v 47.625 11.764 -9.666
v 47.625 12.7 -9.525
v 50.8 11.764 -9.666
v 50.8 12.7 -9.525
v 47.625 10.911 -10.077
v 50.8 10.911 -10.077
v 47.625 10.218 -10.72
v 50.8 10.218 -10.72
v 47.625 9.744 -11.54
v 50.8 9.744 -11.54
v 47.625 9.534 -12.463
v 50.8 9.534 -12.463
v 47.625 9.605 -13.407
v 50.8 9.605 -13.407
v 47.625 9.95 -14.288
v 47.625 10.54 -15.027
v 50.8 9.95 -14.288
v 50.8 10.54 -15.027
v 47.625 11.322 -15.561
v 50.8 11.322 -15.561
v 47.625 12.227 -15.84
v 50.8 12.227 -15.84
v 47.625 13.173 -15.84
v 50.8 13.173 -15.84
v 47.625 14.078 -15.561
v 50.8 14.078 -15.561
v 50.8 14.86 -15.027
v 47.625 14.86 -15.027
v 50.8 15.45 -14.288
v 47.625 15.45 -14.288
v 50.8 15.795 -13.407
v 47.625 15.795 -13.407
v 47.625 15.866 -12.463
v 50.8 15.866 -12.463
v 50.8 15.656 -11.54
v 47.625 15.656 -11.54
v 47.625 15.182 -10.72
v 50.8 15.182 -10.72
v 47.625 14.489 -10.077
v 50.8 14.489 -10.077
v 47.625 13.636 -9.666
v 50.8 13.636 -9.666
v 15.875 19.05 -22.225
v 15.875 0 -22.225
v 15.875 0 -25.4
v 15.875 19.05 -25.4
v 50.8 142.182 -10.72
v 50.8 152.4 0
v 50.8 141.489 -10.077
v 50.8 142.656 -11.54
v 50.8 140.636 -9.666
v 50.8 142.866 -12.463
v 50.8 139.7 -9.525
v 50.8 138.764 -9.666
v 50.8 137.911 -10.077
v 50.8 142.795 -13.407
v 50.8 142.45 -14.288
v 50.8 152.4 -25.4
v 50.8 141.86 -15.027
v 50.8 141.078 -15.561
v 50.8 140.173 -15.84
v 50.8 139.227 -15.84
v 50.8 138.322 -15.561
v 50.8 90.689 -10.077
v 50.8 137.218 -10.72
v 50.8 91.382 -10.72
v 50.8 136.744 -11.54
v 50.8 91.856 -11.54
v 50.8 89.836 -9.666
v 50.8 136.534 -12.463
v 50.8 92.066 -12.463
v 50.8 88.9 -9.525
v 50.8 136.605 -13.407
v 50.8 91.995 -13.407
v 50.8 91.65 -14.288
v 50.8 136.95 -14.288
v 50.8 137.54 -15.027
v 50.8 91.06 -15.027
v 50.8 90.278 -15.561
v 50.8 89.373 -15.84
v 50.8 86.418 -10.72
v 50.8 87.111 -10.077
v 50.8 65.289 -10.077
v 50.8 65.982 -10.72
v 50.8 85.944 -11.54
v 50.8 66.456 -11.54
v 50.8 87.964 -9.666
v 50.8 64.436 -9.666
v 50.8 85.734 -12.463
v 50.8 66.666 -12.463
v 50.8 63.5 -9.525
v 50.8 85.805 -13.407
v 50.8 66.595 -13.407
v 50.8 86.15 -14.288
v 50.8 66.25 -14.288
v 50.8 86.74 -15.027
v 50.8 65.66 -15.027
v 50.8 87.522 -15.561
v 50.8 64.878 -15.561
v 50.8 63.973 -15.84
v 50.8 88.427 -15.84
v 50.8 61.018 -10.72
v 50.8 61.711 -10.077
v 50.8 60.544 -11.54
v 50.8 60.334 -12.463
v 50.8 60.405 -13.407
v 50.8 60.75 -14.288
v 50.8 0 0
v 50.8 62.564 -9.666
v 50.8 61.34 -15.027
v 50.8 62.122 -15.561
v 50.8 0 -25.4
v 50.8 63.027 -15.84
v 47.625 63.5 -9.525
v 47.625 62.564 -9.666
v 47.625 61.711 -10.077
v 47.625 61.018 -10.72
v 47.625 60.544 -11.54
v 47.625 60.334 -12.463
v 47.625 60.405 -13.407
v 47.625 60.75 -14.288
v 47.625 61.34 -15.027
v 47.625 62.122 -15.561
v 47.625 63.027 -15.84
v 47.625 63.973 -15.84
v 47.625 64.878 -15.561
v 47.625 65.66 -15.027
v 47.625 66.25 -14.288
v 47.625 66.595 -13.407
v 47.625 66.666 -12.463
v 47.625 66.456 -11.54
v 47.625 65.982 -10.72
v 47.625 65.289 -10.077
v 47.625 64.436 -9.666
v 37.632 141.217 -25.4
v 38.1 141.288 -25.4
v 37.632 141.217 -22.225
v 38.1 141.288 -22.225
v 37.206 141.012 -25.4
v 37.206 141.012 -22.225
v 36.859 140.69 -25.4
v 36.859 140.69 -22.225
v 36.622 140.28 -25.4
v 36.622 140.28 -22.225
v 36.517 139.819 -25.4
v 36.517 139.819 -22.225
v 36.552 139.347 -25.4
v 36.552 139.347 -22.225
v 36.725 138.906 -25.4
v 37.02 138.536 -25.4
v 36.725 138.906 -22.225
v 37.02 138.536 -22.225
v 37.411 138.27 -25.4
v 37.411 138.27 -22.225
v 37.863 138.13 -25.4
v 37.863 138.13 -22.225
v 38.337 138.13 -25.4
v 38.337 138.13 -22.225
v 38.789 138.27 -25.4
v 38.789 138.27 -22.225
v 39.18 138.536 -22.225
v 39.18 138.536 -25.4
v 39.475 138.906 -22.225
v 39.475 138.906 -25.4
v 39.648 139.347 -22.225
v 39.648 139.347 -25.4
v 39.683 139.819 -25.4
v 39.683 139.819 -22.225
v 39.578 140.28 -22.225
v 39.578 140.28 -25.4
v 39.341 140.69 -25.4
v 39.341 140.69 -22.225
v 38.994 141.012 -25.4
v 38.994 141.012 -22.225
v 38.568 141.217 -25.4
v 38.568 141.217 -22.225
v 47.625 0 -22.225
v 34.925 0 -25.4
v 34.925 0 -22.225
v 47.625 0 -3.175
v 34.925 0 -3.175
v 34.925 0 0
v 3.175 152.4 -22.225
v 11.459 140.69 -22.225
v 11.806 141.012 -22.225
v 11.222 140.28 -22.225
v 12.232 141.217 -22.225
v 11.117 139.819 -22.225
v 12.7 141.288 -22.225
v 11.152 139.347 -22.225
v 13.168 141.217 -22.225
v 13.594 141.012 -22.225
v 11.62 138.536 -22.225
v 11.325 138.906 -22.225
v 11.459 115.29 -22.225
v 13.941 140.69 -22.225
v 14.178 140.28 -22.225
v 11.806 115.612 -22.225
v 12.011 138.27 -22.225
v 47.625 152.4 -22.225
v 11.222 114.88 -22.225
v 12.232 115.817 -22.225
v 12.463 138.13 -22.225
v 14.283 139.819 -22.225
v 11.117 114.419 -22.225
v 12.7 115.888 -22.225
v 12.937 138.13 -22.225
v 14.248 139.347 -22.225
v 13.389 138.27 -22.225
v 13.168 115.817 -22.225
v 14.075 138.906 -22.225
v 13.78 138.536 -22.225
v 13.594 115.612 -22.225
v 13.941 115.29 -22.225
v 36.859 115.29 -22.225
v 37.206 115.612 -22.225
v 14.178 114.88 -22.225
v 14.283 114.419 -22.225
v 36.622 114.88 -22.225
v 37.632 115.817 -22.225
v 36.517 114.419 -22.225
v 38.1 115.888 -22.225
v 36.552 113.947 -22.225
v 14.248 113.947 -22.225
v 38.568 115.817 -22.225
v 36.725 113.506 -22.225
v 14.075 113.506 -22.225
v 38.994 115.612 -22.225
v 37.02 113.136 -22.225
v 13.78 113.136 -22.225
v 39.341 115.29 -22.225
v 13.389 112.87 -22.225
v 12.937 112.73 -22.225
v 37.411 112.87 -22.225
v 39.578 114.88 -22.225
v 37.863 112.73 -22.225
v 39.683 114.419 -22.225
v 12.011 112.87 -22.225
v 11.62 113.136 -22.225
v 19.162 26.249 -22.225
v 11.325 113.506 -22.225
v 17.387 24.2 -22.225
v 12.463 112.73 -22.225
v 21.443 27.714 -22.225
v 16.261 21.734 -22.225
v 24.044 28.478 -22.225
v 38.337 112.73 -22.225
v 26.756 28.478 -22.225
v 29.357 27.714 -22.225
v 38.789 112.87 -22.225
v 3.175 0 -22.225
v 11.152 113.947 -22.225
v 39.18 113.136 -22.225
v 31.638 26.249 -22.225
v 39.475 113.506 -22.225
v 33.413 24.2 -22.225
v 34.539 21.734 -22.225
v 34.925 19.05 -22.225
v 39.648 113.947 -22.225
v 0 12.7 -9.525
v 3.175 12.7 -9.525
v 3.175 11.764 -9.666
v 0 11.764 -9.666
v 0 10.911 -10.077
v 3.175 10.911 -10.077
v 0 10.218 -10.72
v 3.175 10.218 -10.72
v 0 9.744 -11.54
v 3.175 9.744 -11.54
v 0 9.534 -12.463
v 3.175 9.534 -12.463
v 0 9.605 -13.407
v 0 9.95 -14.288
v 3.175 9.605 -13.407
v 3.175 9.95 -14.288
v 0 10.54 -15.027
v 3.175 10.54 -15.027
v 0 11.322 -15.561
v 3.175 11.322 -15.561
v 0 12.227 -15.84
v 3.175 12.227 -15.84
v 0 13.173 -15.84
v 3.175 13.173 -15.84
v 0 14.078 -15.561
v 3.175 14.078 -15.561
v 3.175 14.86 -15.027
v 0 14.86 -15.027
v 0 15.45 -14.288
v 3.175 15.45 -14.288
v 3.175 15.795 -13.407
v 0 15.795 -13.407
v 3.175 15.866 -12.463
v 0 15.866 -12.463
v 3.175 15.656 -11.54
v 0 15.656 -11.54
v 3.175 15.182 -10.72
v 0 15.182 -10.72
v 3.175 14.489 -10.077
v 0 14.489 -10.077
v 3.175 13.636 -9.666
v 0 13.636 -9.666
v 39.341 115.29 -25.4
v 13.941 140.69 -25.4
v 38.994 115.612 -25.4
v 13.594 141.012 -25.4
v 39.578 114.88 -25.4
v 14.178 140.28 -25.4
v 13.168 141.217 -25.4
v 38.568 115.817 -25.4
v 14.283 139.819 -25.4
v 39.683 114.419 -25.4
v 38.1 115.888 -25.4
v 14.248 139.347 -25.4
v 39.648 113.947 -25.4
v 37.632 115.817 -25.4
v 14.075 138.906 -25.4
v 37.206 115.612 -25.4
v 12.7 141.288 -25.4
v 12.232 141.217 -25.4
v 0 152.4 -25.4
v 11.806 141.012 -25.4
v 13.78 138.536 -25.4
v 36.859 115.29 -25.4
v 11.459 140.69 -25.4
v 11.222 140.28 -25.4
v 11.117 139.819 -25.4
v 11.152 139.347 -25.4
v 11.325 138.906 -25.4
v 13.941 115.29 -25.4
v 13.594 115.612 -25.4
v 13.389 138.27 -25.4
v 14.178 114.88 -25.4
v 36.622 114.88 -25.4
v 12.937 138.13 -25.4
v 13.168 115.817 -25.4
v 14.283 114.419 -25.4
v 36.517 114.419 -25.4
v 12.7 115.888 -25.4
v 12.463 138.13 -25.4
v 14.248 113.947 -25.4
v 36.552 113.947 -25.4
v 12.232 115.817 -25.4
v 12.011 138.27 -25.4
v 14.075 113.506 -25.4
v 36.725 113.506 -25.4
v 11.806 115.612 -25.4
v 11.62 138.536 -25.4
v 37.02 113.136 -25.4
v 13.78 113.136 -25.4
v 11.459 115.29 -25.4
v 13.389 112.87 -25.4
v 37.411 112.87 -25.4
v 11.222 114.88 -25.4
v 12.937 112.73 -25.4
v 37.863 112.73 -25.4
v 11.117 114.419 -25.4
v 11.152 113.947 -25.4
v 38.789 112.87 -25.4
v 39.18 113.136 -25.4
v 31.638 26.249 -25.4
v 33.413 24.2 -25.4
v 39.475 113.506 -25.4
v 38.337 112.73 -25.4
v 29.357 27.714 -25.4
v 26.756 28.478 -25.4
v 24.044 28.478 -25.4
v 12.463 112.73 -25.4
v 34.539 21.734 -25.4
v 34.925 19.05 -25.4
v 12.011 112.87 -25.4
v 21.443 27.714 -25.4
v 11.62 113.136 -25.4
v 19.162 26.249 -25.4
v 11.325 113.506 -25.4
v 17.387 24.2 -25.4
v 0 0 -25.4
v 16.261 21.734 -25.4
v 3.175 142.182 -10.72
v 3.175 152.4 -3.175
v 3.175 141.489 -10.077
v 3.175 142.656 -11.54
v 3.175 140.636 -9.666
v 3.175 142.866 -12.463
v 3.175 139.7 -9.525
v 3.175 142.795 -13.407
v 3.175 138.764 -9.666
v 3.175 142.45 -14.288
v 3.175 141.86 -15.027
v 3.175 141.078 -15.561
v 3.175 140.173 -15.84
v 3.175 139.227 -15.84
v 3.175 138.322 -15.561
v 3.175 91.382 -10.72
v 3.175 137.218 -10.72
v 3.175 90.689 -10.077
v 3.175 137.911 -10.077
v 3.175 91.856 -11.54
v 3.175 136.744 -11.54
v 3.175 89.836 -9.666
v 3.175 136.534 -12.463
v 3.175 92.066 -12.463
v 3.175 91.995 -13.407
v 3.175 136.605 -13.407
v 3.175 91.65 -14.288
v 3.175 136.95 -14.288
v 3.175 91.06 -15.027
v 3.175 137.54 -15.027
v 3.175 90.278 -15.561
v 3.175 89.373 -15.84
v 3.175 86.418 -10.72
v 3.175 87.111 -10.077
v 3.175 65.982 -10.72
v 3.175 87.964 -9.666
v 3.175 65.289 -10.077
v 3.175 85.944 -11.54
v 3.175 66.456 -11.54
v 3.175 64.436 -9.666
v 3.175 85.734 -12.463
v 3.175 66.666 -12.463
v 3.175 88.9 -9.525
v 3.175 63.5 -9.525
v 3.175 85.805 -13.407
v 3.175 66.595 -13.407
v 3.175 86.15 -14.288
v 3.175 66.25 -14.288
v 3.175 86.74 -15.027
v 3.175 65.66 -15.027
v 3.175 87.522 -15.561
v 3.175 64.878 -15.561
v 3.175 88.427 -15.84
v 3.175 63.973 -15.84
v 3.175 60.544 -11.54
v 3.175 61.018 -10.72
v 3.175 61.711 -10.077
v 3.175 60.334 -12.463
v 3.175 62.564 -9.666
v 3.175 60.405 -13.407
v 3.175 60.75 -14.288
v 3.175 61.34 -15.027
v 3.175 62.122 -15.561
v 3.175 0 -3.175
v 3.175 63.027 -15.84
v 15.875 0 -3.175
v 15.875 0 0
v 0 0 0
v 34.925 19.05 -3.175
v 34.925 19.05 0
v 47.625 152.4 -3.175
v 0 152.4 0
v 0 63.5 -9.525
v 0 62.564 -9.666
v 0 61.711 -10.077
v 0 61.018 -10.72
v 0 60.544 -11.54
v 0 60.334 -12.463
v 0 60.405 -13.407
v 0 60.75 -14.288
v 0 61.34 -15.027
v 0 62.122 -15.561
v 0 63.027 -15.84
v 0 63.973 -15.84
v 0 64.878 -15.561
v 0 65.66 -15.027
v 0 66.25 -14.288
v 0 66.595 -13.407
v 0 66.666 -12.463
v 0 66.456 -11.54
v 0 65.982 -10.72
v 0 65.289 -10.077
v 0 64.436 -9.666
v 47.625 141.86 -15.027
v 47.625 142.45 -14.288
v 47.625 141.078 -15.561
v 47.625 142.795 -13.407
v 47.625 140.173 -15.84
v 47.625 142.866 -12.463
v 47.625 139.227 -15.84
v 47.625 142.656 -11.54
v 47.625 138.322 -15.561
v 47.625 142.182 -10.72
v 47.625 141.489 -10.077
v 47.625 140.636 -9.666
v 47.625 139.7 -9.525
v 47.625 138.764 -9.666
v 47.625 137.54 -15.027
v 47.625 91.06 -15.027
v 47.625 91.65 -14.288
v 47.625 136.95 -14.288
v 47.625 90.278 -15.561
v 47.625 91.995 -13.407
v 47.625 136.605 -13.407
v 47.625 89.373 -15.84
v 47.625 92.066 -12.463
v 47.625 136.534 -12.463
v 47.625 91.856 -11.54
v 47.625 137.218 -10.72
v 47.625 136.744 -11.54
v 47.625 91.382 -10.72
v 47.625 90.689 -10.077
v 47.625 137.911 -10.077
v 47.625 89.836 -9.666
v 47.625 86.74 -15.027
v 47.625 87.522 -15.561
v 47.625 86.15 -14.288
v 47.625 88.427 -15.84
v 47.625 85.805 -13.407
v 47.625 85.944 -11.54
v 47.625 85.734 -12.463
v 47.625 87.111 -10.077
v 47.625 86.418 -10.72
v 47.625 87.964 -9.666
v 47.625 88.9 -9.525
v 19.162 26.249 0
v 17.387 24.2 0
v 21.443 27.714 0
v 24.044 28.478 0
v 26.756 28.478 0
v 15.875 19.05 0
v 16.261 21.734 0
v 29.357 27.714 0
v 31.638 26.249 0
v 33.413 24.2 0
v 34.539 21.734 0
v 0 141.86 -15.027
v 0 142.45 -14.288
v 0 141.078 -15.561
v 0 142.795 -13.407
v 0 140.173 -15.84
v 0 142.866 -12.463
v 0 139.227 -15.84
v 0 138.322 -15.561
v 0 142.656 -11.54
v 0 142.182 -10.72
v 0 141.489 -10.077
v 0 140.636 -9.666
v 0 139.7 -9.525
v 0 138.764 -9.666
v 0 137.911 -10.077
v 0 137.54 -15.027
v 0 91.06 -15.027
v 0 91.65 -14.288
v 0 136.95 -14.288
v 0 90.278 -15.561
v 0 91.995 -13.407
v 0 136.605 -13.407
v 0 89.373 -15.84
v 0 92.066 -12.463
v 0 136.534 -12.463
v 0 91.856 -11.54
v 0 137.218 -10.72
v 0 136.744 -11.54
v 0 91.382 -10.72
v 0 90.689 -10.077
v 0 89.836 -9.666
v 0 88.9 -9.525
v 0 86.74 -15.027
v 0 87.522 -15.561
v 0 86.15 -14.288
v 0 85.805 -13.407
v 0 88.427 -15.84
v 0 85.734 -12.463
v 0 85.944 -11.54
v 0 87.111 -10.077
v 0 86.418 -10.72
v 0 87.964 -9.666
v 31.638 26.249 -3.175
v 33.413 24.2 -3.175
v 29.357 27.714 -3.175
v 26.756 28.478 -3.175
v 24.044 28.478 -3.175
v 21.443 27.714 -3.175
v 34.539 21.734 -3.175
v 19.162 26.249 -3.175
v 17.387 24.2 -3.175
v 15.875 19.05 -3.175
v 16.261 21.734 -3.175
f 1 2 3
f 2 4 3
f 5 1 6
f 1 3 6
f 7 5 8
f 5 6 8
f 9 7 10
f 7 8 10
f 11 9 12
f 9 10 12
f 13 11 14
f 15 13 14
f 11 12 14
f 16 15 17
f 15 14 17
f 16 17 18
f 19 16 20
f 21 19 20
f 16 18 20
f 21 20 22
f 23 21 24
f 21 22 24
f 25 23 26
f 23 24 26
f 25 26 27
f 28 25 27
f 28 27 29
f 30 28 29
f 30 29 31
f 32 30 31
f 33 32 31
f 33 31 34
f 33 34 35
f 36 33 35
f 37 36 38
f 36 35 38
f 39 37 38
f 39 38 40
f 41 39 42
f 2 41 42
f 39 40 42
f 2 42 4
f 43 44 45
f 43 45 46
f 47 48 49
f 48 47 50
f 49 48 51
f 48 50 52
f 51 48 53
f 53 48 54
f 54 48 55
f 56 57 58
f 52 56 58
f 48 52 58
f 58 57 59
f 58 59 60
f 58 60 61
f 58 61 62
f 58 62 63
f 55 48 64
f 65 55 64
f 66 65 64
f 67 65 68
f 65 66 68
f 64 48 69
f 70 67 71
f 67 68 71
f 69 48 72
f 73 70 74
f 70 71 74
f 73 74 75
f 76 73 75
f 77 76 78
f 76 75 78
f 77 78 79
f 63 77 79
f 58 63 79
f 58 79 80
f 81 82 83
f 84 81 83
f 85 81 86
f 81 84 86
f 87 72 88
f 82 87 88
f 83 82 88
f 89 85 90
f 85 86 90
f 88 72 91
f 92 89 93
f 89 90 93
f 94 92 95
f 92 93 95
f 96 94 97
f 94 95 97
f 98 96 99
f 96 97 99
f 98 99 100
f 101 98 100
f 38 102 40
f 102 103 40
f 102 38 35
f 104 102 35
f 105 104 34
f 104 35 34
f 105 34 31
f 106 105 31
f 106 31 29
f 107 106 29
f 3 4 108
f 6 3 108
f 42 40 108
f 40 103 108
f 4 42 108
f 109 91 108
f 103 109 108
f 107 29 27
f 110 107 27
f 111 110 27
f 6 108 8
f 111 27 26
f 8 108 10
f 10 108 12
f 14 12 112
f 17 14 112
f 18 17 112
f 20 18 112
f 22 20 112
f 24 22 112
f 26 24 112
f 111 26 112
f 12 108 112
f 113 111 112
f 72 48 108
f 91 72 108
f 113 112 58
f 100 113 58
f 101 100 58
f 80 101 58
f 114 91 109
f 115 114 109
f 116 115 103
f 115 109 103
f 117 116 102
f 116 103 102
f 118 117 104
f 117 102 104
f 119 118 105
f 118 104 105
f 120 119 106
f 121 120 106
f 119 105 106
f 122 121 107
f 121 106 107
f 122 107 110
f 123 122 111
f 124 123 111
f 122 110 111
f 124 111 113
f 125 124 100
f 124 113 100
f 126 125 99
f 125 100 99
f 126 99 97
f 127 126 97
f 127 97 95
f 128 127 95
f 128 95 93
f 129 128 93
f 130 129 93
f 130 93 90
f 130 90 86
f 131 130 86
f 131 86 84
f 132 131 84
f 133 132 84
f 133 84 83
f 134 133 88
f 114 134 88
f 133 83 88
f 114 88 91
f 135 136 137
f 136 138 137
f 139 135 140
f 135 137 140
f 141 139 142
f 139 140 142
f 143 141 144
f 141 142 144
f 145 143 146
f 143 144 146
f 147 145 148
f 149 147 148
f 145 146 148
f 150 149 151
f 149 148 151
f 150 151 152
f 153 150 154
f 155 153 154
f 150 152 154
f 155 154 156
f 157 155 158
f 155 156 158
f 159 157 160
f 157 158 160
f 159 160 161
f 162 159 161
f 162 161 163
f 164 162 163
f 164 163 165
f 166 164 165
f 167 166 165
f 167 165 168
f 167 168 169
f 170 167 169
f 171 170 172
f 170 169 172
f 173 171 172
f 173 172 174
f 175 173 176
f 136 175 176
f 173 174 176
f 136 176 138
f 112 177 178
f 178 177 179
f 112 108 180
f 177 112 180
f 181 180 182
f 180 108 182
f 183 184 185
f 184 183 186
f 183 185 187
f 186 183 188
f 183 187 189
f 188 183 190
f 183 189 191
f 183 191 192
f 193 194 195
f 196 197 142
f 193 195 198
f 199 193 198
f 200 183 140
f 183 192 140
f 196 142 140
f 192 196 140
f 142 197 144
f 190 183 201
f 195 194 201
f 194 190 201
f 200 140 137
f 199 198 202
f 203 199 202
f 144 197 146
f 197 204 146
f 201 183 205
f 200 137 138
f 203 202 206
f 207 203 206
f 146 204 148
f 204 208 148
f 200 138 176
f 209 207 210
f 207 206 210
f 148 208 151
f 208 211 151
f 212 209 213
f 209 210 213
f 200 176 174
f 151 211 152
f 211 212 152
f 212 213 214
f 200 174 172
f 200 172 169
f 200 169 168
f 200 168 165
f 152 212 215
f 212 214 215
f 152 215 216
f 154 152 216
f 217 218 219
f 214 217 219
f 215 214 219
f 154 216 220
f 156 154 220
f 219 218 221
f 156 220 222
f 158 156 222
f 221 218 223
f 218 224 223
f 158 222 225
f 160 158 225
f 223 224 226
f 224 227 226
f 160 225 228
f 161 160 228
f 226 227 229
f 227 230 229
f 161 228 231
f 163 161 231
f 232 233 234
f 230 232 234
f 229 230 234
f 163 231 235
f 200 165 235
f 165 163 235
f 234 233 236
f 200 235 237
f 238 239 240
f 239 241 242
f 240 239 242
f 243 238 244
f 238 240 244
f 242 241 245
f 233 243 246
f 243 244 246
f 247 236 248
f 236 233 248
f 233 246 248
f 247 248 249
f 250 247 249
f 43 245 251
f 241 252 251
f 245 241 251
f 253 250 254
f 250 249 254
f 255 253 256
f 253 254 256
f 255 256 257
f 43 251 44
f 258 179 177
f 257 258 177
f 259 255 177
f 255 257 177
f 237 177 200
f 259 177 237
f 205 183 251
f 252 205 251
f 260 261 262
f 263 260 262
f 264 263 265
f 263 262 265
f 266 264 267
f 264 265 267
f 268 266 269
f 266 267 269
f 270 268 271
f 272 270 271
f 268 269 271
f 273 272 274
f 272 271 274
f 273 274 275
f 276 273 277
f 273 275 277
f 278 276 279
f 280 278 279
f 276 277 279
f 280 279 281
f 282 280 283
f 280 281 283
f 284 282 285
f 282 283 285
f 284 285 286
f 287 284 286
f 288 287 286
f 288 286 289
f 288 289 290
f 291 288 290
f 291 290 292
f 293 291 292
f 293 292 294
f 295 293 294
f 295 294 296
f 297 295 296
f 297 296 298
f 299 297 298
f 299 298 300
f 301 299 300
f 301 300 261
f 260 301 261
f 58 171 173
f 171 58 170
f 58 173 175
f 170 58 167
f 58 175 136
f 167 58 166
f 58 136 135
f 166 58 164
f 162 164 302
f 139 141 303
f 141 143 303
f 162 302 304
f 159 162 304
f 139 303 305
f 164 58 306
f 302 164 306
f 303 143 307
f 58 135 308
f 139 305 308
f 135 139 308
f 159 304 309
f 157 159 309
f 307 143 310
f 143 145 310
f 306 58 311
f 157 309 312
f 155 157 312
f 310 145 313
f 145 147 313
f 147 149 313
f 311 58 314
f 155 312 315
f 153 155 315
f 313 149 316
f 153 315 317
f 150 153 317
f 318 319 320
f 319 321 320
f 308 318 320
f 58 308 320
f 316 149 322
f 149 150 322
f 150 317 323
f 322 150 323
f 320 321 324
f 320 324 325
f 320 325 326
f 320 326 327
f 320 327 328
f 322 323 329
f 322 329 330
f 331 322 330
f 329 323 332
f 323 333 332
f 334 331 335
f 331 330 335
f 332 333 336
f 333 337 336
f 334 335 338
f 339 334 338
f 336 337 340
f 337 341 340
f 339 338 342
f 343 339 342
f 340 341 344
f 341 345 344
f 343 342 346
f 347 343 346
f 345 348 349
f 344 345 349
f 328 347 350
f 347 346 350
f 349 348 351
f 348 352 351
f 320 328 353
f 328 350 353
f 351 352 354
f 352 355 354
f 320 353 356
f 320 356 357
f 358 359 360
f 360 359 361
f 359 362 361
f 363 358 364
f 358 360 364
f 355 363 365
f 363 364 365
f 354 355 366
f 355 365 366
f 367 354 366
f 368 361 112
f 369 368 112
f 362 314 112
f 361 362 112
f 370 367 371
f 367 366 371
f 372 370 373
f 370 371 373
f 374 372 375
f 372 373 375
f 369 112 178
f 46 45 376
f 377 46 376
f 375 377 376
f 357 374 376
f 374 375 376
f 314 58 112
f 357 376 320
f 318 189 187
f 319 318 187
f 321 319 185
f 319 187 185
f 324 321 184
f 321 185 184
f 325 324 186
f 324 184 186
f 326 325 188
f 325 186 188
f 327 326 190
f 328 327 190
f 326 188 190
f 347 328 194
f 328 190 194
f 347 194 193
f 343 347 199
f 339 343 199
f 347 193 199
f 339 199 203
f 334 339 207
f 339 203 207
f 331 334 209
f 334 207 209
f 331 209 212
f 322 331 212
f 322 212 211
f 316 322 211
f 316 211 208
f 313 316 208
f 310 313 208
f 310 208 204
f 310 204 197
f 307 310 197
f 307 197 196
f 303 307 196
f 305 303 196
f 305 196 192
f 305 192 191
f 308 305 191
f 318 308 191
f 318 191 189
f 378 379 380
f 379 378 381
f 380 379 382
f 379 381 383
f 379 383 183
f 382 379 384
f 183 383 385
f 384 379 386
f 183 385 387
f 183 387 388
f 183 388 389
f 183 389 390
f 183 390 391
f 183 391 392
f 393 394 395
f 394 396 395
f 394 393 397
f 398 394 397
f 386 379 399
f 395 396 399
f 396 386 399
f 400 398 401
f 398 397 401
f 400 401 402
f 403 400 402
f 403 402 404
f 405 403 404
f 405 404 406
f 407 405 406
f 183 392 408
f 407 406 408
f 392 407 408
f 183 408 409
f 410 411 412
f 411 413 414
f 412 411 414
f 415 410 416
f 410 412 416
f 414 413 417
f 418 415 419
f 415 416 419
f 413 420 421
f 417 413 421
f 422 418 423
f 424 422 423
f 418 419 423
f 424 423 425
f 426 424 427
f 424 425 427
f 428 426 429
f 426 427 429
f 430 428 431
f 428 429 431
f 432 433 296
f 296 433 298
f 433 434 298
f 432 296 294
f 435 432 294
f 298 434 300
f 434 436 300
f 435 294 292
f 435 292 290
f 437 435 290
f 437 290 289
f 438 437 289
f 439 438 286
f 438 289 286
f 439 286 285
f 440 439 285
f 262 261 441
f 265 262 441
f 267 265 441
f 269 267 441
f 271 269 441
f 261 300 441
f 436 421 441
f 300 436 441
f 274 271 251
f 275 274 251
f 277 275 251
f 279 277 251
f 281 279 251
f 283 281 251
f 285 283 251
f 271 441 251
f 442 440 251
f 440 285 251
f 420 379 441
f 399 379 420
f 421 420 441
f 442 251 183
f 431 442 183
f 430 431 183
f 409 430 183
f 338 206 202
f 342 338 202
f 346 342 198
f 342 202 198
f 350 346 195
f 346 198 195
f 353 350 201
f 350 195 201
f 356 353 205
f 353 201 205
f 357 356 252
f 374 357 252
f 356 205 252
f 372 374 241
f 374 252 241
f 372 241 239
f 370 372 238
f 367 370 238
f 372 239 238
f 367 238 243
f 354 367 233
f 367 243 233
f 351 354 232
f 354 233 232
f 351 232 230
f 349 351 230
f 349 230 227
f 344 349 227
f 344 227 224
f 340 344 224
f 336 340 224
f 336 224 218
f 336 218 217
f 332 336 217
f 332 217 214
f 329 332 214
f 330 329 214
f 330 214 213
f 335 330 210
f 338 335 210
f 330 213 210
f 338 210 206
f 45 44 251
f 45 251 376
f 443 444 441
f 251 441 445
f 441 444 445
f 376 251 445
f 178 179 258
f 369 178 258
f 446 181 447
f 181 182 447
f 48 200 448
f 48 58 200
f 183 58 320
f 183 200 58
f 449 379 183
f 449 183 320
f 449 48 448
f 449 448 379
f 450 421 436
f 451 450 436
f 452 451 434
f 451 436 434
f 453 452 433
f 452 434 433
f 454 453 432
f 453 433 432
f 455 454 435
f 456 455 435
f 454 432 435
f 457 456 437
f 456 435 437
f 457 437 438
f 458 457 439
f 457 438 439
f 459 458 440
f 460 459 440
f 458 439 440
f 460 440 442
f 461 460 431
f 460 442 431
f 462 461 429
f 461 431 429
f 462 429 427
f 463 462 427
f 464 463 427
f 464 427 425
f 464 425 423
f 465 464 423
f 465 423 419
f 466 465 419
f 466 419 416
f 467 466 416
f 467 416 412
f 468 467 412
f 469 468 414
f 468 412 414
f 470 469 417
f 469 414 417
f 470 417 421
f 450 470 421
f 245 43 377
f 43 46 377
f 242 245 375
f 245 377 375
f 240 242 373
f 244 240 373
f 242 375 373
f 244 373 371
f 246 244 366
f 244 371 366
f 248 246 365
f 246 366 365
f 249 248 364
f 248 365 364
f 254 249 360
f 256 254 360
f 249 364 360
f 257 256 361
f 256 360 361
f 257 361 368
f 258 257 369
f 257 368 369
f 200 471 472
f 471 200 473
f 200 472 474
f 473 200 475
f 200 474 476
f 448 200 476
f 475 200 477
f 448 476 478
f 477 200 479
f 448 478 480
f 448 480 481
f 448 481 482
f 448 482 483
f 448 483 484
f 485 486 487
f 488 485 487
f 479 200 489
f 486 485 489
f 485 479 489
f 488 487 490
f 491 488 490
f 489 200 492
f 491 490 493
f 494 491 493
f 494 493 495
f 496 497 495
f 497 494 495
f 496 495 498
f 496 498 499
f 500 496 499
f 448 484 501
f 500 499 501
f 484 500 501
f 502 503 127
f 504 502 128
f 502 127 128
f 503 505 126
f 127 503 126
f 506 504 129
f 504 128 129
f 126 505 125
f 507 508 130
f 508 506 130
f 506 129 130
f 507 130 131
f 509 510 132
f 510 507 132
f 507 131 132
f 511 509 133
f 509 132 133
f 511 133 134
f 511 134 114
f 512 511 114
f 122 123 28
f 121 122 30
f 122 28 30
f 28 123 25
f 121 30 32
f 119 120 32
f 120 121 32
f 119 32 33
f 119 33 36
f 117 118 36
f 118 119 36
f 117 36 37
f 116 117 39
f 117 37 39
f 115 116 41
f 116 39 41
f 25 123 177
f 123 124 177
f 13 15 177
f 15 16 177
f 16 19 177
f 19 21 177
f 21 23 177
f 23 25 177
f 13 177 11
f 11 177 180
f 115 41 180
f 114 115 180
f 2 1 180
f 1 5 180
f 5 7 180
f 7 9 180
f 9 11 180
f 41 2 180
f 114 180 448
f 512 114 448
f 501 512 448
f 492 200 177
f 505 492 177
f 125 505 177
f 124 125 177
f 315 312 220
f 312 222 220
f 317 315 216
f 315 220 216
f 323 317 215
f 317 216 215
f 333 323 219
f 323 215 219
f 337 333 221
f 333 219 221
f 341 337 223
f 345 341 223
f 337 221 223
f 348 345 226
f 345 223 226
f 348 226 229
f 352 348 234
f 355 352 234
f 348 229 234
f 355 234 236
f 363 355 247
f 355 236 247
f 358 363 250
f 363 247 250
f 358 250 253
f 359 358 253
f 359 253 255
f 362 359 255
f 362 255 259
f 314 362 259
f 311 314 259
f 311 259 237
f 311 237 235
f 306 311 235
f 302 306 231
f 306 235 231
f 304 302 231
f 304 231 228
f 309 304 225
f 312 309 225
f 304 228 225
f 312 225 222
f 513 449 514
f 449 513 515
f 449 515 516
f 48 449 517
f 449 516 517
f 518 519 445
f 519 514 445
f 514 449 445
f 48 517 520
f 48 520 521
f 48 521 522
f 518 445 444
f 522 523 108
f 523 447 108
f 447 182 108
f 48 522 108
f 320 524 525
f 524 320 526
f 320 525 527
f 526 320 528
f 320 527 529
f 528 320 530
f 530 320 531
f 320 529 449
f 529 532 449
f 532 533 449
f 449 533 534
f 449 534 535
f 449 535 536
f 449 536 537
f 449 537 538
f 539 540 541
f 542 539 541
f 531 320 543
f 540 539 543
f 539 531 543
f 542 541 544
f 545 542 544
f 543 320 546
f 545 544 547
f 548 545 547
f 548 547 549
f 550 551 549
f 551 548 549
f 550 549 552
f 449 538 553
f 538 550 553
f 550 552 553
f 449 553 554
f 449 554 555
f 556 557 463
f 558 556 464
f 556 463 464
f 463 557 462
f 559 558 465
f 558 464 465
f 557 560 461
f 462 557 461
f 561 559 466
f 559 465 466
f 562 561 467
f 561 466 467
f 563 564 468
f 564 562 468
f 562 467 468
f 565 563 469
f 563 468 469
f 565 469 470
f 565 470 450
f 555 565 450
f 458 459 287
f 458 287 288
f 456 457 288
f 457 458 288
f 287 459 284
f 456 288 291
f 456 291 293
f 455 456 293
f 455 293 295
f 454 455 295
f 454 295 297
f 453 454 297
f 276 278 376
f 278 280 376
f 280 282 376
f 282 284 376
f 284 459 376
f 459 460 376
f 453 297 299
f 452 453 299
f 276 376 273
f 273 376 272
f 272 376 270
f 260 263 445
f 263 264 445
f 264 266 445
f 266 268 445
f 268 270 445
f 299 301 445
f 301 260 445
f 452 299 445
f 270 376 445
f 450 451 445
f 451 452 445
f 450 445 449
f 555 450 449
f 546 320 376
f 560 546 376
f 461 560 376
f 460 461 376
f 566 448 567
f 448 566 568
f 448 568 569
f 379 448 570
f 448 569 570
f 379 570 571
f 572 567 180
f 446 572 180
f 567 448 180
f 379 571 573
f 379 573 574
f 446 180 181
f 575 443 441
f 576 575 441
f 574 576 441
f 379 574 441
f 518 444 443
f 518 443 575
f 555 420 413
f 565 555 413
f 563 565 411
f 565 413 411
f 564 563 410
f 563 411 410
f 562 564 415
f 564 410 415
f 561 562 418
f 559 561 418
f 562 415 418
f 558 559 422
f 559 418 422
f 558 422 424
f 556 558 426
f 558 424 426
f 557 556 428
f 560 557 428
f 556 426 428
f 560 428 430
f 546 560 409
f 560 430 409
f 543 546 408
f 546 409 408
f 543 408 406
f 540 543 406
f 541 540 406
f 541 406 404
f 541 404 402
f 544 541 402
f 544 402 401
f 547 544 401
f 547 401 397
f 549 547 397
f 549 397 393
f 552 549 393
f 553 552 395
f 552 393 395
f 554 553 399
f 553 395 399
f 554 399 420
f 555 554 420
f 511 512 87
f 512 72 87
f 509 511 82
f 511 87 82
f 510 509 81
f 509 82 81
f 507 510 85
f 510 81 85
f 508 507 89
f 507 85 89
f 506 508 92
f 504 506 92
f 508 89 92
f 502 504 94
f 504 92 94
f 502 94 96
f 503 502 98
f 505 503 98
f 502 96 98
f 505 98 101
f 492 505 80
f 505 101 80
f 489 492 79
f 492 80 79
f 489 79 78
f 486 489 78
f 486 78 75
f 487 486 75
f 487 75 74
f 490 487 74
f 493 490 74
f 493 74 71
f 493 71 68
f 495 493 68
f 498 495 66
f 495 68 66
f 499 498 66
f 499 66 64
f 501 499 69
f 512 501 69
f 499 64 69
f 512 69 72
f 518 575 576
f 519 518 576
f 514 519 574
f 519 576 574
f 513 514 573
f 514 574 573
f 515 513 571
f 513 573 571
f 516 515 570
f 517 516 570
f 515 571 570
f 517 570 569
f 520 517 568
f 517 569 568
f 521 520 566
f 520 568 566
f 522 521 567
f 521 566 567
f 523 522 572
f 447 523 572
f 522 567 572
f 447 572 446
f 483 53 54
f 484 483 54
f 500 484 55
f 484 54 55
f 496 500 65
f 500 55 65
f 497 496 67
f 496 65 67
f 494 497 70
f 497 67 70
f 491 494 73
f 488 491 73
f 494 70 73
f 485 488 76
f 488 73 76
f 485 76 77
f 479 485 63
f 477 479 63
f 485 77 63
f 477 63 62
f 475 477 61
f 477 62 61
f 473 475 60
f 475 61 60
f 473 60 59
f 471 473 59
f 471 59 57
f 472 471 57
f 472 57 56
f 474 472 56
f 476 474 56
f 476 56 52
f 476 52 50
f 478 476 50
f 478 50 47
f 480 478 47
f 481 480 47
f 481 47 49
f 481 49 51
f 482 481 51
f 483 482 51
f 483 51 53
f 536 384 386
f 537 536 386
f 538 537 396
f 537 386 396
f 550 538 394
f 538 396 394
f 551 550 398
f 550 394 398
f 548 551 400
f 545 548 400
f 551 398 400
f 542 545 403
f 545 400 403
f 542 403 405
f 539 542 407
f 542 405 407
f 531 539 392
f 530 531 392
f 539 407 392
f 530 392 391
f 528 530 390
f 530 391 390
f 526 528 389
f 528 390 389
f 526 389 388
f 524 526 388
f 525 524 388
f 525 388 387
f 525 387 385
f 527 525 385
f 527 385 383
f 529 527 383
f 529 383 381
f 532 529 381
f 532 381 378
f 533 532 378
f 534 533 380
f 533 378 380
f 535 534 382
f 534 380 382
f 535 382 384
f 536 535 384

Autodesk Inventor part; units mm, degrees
ref_plane "YZ Plane" through (0, 0, 0) normal (1, 0, 0) x (0, 1, 0)
ref_plane "XZ Plane" through (0, 0, 0) normal (0, 1, 0) x (-1, 0, 0)
ref_plane "XY Plane" through (0, 0, 0) normal (0, 0, 1) x (1, 0, 0)
sketch "Sketch1" plane through (0, 0, 0) normal (0, 1, 0) x (-1, 0, 0)
  line L0 (0, 0) -> (-50.8, 0)
  line L1 (-50.8, 0) -> (-50.8, -25.4)
  line L2 (-50.8, -25.4) -> (0, -25.4)
  line L3 (0, -25.4) -> (0, 0)
  line L4 (-3.175, -22.225) -> (-47.625, -22.225)
  line L5 (-47.625, -22.225) -> (-47.625, -3.175)
  line L6 (-47.625, -3.175) -> (-3.175, -3.175)
  line L7 (-3.175, -3.175) -> (-3.175, -22.225)
  dimension "d0" = 50.8
  dimension "d1" = 25.4
  dimension "d2" = 44.45
  dimension "d3" = 19.05
  dimension "d4" = 3.175
  dimension "d5" = 3.175
extrude "Extrusion1" add sketch "Sketch1" along normal blind 152.4
sketch "Sketch2" plane through (0, 0, -25.4) normal (-1, 0, 0) x (0, 0, 1)
  line L0 (22.225, 152.4) -> (3.175, 152.4) projected
  line L1 (12.7, 152.4) -> (12.7, 0) construction
  line L2 (3.175, 0) -> (22.225, 0) projected
  line L3 (0, 0) -> (0, 152.4) construction
  line L4 (25.4, 0) -> (25.4, 152.4) construction
  line L5 (25.4, 0) -> (25.4, 152.4) projected
  line L6 (25.4, 76.2) -> (0, 76.2) construction
  circle A0 centre (12.7, 88.9) radius 3.175
  circle A1 centre (12.7, 63.5) radius 3.175
  circle A2 centre (12.7, 139.7) radius 3.175
  circle A3 centre (12.7, 12.7) radius 3.175
  dimension "d8" = 6.35
  dimension "d9" = 12.7
  dimension "d10" = 6.35
  dimension "d11" = 12.7
hole "Hole2" at (0, 139.7, -12.7) at (0, 88.9, -12.7) at (0, 63.5, -12.7) at (0, 12.7, -12.7) direction (1, 0, 0) diameter 6.35 end through all
sketch "Sketch3" plane through (50.8, 0, -25.4) normal (0, 0, -1) x (-1, 0, 0)
  line L0 (50.8, 152.4) -> (0, 152.4) projected
  line L1 (25.4, 152.4) -> (25.4, 0) construction
  line L2 (12.7, 152.4) -> (12.7, 139.7) construction
  line L3 (0, 0) -> (0, 152.4) projected
  line L4 (0, 127) -> (50.8, 127) construction
  circle A0 centre (12.7, 139.7) radius 1.5875
  circle A1 centre (38.1, 139.7) radius 1.5875
  circle A2 centre (12.7, 114.3) radius 1.5875
  circle A3 centre (38.1, 114.3) radius 1.5875
  point P0 (50.8, 0)
  dimension "d27" = 12.7
  dimension "d28" = 12.7
  dimension "d30" = 3.175
  dimension "d31" = 25.4
hole "Hole3" at (38.1, 139.7, -25.4) at (38.1, 114.3, -25.4) at (12.7, 114.3, -25.4) at (12.7, 139.7, -25.4) direction (0, 0, 1) diameter 3.175 depth 3.175 tip angle 118
sketch "Sketch4" plane through (0, 0, 0) normal (0, 0, 1) x (1, 0, 0)
  line L0 (0, 0) -> (50.8, 0) projected
  line L1 (34.925, 0) -> (34.925, 19.05)
  line L2 (15.875, 0) -> (15.875, 19.05)
  line L3 (0, 0) -> (0, 152.4) projected
  line L4 (50.8, 0) -> (50.8, 152.4) projected
  circle A0 centre (25.4, 19.05) radius 9.525
  line L5 (15.875, 0) -> (34.925, 0)
  line L6 (47.625, 0) -> (3.175, 0) projected
  line L7 (15.875, 19.05) -> (34.925, 19.05)
  line L8 (34.925, 19.05) -> (34.925, 0)
  line L9 (34.925, 0) -> (15.875, 0)
  line L10 (15.875, 0) -> (15.875, 19.05)
  dimension "d39" = 15.875
  dimension "d40" = 15.875
  dimension "d48" = 19.05
  dimension "d49" = 19.05
hole "Hole4" at (25.4, 19.05, 0) direction (0, 0, -1) diameter 19.05 depth 25.4 tip angle 118
extrude "Extrusion2" cut sketch "Sketch4" against normal blind 25.4 contours L2 A0 L1 L0 | L7 A0 picked at (22.9312, 16.1848)
properties part number "2AM-17-P-0205" material "Aluminum 6061"
